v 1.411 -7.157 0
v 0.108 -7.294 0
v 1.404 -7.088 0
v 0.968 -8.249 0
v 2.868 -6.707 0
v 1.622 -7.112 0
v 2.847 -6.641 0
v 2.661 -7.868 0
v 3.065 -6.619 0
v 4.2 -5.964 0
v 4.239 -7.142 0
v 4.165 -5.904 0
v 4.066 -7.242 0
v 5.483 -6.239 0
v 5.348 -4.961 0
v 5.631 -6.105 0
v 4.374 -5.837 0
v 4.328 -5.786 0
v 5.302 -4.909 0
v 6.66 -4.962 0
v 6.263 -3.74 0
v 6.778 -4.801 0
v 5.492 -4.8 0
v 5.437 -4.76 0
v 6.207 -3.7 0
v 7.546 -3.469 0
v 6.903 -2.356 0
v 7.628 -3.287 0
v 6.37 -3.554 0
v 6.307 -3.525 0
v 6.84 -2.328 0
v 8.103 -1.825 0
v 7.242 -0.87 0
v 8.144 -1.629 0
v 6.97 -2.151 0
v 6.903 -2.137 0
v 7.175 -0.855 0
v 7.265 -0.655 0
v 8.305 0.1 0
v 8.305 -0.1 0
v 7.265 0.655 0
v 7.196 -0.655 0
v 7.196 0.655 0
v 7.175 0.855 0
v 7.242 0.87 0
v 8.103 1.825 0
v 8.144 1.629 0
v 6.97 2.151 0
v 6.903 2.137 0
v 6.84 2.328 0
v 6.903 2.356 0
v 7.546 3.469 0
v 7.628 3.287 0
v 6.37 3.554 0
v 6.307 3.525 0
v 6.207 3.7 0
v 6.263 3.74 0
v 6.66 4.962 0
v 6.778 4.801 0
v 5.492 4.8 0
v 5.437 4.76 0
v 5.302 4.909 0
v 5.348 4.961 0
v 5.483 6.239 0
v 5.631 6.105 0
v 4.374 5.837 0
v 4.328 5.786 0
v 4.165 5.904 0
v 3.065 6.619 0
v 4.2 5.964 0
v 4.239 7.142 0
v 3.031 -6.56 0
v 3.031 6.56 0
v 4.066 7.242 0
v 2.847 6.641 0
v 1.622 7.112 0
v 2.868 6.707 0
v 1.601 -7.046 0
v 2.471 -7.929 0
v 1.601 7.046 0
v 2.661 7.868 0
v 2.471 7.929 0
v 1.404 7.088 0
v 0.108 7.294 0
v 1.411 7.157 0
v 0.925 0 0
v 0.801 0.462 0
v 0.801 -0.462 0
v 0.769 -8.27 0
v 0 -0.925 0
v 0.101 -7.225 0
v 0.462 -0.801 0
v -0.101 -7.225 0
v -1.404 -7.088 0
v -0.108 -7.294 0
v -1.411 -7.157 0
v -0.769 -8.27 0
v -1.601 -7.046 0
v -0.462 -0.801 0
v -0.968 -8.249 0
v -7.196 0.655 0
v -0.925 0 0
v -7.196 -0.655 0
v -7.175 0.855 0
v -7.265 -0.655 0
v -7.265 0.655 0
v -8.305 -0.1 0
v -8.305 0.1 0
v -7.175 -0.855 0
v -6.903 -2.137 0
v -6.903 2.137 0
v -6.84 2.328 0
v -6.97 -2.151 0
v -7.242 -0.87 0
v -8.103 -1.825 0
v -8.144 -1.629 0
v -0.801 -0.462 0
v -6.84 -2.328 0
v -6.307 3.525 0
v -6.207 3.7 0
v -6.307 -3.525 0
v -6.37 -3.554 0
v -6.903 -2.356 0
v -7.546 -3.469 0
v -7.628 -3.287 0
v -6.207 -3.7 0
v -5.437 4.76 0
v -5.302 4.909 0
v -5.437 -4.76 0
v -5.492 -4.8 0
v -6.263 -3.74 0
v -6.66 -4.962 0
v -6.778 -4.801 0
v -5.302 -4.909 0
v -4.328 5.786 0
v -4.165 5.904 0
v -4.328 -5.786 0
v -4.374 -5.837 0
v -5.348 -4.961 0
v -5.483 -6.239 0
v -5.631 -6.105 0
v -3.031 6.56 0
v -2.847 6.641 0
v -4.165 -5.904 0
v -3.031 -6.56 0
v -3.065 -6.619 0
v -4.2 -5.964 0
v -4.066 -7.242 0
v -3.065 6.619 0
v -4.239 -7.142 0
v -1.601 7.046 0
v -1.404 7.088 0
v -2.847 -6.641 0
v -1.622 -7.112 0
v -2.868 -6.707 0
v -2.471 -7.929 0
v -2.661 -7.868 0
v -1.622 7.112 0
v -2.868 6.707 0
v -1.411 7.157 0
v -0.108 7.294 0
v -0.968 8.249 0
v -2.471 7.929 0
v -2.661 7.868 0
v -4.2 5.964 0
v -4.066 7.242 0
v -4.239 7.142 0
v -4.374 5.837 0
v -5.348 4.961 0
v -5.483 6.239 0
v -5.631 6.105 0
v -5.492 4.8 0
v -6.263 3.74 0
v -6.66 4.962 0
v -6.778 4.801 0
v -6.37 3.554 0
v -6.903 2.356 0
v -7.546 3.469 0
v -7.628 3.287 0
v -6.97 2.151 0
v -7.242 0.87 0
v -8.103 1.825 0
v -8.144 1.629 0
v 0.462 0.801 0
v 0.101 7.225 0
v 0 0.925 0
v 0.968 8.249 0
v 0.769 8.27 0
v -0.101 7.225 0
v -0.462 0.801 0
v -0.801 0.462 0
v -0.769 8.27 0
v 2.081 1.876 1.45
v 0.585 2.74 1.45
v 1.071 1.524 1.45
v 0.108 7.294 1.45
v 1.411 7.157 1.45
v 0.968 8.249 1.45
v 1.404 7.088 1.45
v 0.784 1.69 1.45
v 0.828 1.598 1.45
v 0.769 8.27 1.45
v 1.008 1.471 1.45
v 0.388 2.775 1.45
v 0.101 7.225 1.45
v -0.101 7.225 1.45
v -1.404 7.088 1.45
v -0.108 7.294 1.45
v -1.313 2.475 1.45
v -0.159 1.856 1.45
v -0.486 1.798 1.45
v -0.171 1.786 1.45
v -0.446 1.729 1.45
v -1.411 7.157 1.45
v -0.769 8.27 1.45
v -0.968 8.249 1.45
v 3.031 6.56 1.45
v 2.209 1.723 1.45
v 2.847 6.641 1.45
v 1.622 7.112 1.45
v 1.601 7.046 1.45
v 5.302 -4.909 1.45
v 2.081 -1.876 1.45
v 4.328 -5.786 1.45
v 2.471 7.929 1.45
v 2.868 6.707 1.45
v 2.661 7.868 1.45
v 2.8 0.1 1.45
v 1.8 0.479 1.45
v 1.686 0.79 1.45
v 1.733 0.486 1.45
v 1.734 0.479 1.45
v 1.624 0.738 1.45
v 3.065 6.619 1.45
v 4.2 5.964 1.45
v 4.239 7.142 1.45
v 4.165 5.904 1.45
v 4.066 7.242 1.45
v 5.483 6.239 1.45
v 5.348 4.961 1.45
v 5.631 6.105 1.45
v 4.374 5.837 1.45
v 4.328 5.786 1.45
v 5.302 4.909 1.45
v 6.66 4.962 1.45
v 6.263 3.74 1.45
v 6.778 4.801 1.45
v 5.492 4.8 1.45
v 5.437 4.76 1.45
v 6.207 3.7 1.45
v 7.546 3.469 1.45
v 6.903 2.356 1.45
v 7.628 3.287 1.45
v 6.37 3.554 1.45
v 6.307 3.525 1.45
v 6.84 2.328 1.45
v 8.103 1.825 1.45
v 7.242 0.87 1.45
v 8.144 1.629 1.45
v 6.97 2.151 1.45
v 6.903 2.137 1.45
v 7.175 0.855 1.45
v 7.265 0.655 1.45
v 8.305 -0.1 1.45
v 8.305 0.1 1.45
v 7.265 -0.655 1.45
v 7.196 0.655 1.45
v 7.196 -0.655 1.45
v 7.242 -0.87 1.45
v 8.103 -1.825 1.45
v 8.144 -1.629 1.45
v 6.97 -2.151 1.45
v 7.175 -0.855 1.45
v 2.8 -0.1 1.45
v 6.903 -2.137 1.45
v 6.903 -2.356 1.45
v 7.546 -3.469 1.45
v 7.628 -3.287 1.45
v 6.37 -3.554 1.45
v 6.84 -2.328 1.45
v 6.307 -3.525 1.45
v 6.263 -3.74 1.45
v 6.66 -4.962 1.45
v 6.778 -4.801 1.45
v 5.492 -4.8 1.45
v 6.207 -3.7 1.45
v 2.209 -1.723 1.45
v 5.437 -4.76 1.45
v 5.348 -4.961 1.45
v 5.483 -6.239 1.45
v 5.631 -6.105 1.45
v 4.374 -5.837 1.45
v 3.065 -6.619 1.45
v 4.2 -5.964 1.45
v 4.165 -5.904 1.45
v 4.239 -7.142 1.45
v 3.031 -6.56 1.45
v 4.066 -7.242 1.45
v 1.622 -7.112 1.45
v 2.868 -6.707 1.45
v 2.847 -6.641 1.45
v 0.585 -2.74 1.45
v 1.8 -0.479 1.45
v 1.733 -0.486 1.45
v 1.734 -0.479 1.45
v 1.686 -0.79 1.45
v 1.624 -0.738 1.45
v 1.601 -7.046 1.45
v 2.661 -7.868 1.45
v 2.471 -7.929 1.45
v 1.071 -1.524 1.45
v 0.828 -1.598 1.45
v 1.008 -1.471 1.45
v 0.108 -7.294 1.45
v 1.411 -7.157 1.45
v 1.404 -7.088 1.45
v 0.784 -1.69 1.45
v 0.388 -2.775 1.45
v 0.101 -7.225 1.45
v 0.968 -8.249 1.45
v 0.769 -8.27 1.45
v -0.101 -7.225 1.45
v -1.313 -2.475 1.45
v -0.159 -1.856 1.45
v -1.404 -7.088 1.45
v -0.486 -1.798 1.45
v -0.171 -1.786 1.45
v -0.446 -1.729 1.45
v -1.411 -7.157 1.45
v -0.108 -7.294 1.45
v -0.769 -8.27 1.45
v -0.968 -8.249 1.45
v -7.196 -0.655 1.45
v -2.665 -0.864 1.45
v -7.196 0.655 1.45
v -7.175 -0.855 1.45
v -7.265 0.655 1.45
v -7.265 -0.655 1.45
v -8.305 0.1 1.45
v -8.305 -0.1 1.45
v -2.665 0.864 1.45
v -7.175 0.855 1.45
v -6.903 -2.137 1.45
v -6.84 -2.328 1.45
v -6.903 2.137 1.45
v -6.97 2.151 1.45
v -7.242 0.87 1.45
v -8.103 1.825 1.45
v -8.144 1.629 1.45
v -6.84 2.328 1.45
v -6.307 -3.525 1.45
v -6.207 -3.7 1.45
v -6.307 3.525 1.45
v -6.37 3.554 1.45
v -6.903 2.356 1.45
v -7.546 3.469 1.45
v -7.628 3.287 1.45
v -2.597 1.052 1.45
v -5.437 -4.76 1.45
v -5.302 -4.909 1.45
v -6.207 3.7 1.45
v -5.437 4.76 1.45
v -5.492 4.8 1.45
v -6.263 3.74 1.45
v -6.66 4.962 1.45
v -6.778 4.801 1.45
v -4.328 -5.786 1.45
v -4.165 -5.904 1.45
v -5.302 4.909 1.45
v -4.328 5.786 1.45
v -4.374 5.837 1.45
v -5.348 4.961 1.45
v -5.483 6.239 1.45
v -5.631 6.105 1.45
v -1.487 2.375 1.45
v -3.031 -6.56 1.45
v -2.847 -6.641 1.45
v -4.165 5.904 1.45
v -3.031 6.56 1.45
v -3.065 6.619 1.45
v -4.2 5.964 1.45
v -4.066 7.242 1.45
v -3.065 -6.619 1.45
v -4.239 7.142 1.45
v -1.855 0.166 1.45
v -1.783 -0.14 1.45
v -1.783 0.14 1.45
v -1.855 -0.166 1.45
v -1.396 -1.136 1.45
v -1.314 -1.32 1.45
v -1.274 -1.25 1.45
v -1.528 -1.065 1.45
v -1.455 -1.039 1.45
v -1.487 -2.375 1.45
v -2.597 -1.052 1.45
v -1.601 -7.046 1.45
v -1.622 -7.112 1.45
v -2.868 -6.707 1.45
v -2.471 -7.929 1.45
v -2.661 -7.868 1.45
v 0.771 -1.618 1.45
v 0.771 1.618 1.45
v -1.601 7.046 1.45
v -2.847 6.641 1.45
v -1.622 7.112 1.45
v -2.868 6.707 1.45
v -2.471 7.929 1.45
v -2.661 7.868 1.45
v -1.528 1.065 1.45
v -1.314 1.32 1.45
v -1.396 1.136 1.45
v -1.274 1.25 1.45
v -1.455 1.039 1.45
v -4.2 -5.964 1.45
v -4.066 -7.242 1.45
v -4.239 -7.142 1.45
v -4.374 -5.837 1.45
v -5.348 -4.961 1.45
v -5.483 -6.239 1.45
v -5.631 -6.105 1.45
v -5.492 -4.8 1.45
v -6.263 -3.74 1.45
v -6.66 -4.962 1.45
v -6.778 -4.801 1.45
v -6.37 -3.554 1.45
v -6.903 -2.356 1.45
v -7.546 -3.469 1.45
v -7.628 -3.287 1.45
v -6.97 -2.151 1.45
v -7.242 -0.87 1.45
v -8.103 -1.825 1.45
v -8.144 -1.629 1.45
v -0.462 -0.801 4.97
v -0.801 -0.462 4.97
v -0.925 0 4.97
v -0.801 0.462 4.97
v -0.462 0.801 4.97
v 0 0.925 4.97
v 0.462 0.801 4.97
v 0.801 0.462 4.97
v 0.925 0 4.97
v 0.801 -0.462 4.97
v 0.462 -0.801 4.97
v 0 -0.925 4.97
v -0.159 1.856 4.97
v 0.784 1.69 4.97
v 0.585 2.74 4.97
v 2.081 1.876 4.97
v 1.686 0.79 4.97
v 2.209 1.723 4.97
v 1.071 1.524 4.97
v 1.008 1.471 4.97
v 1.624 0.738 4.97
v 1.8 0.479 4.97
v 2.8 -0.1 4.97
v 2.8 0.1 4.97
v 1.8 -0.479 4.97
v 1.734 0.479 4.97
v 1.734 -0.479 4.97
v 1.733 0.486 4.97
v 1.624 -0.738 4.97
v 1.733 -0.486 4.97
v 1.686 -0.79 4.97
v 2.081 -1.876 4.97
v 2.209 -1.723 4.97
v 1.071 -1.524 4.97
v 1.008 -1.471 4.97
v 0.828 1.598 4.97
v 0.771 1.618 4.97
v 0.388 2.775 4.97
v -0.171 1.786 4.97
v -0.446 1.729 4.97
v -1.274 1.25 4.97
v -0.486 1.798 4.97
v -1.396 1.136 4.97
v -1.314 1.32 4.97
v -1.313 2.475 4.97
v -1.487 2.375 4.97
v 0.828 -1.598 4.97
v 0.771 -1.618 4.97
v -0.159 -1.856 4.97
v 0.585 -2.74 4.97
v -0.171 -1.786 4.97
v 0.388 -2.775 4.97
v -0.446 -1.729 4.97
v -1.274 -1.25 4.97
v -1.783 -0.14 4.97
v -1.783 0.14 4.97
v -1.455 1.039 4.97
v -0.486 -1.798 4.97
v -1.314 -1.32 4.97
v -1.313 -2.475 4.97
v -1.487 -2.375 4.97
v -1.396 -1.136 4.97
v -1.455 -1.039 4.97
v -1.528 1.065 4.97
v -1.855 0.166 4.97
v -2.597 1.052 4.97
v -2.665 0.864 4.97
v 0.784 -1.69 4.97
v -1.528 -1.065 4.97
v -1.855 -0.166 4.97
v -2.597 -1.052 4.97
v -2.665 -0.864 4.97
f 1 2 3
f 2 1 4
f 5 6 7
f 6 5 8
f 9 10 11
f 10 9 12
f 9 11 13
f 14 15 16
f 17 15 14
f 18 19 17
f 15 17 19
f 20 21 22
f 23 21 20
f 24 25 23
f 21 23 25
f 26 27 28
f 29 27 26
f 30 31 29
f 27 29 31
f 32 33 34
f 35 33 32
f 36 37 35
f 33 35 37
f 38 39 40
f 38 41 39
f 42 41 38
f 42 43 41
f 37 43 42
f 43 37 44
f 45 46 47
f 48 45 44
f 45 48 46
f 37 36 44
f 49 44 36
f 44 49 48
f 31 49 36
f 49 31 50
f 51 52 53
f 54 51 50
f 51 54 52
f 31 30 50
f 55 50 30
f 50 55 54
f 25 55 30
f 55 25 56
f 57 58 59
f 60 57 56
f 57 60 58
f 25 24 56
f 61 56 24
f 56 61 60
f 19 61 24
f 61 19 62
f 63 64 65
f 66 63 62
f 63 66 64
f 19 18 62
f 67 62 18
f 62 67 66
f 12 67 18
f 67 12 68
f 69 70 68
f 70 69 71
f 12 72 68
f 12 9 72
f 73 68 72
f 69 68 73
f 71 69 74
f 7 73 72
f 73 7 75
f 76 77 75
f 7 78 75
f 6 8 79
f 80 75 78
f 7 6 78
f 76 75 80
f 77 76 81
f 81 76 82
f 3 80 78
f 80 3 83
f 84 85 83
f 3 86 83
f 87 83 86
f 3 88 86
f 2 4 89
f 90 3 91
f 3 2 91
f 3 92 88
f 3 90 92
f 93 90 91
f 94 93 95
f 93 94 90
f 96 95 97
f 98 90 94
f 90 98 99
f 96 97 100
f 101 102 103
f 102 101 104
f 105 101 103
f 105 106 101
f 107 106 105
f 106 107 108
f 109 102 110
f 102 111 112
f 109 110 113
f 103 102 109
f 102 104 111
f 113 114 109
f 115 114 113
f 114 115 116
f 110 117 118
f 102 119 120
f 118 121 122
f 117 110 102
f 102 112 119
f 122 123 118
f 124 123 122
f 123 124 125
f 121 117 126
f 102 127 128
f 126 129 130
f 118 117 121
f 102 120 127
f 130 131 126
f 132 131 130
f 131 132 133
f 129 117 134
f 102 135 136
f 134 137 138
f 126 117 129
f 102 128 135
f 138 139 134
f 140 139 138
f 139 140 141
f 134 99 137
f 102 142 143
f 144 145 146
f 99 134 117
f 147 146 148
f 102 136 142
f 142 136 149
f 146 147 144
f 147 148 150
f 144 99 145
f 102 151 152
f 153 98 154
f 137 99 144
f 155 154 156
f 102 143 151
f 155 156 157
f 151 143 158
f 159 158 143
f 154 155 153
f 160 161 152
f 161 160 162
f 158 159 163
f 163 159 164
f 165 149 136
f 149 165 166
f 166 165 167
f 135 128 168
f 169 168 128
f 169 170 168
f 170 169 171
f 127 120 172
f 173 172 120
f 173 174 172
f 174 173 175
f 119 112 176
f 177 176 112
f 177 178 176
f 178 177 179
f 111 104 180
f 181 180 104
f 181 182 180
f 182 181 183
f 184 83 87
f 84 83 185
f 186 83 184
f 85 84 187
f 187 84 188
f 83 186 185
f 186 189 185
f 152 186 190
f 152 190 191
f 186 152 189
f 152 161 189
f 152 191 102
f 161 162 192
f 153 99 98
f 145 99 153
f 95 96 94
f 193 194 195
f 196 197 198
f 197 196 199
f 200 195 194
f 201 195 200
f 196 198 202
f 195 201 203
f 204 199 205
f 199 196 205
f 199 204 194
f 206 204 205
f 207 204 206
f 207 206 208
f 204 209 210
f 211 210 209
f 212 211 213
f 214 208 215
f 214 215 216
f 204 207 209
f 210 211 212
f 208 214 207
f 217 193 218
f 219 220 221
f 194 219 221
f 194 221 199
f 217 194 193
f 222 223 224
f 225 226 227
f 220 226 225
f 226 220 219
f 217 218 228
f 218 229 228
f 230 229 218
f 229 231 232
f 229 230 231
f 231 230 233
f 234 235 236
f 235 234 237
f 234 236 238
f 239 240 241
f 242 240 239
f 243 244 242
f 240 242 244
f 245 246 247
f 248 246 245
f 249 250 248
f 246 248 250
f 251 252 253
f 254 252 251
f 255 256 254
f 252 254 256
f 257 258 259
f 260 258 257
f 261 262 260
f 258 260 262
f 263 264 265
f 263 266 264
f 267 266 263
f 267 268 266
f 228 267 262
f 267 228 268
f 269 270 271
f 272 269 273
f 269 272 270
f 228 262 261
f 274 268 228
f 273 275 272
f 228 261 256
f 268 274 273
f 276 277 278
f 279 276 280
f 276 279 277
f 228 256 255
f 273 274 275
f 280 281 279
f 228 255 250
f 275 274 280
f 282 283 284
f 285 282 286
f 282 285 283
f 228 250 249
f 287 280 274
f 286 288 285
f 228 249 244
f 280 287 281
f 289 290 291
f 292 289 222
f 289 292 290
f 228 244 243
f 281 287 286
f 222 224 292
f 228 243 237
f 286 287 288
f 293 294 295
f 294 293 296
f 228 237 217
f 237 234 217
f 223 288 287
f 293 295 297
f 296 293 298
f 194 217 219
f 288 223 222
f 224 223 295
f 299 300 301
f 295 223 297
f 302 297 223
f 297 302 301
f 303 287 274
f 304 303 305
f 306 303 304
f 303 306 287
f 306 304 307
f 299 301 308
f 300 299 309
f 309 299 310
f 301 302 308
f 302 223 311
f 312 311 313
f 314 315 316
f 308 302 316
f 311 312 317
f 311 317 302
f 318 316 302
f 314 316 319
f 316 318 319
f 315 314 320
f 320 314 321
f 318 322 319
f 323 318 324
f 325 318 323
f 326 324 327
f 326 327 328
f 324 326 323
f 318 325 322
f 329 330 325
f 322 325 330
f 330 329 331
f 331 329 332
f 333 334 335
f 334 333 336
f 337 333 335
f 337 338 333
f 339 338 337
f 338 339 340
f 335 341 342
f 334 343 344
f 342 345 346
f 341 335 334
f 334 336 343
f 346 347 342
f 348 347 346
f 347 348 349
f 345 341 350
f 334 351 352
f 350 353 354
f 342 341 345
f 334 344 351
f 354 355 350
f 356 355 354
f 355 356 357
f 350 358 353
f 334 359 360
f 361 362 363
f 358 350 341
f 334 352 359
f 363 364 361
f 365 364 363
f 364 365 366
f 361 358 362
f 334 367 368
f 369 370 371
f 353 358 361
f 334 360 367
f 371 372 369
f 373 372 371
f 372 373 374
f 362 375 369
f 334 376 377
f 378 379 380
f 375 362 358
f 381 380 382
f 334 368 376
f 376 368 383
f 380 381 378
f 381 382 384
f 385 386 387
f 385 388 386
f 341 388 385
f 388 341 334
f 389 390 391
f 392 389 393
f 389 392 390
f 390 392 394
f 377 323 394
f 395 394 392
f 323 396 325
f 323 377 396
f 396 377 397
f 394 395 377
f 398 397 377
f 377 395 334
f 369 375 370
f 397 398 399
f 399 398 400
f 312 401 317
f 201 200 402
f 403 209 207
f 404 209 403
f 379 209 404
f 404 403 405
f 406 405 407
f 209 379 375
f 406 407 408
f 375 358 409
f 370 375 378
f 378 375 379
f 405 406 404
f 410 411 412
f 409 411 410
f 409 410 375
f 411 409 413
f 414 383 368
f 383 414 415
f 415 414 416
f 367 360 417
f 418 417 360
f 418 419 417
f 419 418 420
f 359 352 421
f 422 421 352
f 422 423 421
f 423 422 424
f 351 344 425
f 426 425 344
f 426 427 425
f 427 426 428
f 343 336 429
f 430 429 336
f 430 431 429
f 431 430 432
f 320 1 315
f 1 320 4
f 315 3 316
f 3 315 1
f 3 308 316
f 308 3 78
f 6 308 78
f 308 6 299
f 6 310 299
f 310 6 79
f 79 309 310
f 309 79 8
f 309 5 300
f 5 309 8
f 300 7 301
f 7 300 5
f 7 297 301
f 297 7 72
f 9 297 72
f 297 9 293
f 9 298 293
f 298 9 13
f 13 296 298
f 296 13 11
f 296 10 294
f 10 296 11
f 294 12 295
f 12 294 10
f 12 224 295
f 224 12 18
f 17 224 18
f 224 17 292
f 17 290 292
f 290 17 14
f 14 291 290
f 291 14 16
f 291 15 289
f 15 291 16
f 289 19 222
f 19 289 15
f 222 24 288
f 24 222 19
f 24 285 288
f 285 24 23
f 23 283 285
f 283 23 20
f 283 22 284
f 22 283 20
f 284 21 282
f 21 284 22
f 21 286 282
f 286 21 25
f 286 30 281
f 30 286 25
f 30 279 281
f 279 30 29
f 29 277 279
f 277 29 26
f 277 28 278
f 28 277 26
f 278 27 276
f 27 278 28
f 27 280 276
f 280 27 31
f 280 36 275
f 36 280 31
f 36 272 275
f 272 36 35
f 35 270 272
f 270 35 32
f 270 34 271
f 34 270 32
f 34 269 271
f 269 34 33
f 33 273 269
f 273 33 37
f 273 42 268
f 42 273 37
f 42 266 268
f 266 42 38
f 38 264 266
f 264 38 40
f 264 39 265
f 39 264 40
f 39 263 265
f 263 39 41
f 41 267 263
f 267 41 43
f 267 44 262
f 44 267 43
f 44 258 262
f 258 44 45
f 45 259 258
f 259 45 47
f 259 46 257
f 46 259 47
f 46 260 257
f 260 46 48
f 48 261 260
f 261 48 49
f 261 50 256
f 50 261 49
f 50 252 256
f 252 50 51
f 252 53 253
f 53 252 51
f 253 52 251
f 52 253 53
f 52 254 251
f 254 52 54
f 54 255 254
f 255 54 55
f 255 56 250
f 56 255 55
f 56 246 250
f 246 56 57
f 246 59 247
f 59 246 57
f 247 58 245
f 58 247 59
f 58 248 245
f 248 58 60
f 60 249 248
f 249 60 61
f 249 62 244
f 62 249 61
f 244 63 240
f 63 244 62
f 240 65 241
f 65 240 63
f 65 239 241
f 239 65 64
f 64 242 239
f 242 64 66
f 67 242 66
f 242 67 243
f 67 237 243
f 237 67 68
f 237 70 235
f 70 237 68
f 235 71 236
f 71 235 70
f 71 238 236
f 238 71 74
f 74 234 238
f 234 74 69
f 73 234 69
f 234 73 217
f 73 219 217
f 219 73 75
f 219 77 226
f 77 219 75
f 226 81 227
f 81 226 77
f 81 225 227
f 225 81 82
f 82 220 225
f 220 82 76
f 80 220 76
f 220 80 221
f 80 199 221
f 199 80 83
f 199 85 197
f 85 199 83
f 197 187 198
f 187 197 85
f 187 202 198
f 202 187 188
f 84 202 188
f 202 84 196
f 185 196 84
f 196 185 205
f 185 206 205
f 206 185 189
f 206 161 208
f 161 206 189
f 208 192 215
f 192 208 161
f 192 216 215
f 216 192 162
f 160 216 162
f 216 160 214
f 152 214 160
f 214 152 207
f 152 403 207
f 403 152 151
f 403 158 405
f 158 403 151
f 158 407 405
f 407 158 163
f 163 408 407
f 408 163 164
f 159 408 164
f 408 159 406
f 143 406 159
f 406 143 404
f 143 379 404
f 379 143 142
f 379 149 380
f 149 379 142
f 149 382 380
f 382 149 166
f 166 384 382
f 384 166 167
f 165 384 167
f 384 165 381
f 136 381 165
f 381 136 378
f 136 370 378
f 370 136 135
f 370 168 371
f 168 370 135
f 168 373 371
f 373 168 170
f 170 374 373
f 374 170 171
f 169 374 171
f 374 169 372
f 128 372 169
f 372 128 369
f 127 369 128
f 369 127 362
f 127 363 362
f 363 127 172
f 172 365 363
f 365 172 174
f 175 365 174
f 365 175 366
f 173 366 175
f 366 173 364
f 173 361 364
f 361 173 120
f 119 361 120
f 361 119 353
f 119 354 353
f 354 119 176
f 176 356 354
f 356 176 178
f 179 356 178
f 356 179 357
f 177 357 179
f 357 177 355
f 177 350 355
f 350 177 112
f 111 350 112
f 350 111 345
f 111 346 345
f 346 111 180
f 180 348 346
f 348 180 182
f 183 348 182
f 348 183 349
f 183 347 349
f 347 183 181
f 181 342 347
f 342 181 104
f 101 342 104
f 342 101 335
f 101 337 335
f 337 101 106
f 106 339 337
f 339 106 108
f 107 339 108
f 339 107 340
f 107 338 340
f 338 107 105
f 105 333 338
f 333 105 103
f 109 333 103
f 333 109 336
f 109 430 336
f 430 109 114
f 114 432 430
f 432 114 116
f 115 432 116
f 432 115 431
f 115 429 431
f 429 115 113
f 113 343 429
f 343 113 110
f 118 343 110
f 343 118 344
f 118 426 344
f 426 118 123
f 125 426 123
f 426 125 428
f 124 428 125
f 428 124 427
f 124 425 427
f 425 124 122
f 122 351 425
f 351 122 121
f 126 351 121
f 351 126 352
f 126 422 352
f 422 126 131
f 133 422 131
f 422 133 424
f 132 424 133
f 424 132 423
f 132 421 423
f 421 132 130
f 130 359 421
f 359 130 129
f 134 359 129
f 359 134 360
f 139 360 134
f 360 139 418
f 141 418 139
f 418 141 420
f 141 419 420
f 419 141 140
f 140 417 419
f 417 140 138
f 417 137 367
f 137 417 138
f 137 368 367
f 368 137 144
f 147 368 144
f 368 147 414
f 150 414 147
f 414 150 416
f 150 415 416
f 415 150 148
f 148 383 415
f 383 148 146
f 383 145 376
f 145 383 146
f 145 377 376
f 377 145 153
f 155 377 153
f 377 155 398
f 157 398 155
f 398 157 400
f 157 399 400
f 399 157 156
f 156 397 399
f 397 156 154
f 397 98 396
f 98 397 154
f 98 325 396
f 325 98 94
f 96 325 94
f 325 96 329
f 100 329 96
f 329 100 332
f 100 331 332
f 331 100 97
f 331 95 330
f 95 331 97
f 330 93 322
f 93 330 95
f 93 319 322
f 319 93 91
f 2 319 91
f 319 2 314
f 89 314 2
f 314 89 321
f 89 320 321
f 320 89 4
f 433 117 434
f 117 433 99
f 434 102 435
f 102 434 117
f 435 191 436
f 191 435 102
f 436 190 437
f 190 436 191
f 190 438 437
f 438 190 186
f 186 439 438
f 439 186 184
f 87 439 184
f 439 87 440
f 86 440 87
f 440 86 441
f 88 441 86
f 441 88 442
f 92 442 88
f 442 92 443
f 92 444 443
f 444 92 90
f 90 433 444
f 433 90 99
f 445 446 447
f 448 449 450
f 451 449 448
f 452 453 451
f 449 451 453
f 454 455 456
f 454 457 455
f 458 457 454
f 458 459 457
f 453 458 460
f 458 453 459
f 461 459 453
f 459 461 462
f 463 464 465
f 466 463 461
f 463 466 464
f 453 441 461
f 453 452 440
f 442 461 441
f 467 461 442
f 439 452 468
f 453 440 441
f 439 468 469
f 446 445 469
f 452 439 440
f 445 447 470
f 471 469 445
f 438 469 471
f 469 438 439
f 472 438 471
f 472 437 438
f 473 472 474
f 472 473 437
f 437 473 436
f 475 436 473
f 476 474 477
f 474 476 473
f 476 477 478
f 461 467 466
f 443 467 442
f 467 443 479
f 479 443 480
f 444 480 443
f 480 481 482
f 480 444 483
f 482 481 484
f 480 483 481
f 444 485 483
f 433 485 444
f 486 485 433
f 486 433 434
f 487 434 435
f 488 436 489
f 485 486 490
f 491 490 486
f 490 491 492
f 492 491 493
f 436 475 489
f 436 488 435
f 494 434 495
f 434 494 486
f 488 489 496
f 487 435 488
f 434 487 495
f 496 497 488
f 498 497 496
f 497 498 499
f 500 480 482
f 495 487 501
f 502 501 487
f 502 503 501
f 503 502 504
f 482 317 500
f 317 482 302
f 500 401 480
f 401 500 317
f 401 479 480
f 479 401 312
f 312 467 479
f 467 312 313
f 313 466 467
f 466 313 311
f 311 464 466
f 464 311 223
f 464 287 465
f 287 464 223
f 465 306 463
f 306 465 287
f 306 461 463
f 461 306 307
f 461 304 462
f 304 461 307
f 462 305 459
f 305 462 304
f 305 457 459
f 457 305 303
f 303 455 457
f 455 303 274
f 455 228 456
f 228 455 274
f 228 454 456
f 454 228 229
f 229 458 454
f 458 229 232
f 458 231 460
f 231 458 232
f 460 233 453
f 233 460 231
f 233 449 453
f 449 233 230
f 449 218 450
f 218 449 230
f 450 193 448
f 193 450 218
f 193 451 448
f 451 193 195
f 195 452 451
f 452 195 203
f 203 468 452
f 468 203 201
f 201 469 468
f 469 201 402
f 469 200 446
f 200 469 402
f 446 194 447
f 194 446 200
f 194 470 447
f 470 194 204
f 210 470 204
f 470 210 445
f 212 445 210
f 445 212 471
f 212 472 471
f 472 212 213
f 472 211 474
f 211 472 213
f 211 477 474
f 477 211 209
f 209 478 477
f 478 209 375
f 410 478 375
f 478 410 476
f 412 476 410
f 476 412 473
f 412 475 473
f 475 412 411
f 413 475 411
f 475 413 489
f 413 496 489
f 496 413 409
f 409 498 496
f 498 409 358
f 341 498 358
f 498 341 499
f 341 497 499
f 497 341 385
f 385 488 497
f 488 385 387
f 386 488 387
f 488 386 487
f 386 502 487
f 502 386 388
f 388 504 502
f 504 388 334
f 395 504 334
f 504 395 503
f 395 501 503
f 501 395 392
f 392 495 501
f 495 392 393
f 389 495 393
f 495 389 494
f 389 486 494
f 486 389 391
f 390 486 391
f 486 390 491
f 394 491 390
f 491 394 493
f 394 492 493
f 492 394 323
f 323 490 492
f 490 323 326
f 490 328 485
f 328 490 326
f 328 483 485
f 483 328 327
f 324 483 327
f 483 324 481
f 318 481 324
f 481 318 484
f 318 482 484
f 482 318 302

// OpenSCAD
numberOfTheetOfLargeWheel = 30;
innerRadiusOfLargeWheel=7.265; 
outerRadiusOfLargeWheel=8.305;
topLandWidthOfLargeWheel=0.2;
spaceWidthOfLargeWheel=0.2;
depthOfLargeWheel=1.45;
cutoutRadius=0.925;

numberOfTheetOfInnerWheel = 9;
innerRadiusOfInnerWheel=1.8; 
outerRadiusOfInnerWheel=2.8;
topLandWidthOfInnerWheel=0.2;
spaceWidthOfInnerWheel=0.2;
depthOfInnerWheel=4.97;


module oneTooth(pos,angle,r, r2, circularThickness, spaceWidth) {
	translate(pos){
		rotate(a = angle) {
			polygon(points=[[0,-circularThickness/2],[r,-circularThickness/2],[r2,-spaceWidth/2],[r2,spaceWidth/2],[r,circularThickness/2],[0,circularThickness/2]]);
		}
	}
}

module cogwheel(numTeeth, r, r2, topLandWidth, spaceWidth, depth, cutout_radius) {
	circularThickness=r*sin(360/numTeeth)-topLandWidth;
	$fs = 0.5;
	linear_extrude(depth){
		difference() {
			union(){
				circle(r);
				for(i = [0:numTeeth-1]) {
					oneTooth([0,0,0],(360*i/numTeeth), r, r2, circularThickness, spaceWidth);
				}
			}
			circle(cutout_radius);
		}
	}
}

cogwheel(numTeeth=numberOfTheetOfLargeWheel, r=innerRadiusOfLargeWheel, r2=outerRadiusOfLargeWheel, topLandWidth=topLandWidthOfLargeWheel, spaceWidth=spaceWidthOfLargeWheel, depth=depthOfLargeWheel, cutout_radius=cutoutRadius);

cogwheel(numTeeth=numberOfTheetOfInnerWheel, r=innerRadiusOfInnerWheel, r2=outerRadiusOfInnerWheel, topLandWidth=topLandWidthOfInnerWheel, spaceWidth=spaceWidthOfInnerWheel, depth=depthOfInnerWheel, cutout_radius=cutoutRadius);

